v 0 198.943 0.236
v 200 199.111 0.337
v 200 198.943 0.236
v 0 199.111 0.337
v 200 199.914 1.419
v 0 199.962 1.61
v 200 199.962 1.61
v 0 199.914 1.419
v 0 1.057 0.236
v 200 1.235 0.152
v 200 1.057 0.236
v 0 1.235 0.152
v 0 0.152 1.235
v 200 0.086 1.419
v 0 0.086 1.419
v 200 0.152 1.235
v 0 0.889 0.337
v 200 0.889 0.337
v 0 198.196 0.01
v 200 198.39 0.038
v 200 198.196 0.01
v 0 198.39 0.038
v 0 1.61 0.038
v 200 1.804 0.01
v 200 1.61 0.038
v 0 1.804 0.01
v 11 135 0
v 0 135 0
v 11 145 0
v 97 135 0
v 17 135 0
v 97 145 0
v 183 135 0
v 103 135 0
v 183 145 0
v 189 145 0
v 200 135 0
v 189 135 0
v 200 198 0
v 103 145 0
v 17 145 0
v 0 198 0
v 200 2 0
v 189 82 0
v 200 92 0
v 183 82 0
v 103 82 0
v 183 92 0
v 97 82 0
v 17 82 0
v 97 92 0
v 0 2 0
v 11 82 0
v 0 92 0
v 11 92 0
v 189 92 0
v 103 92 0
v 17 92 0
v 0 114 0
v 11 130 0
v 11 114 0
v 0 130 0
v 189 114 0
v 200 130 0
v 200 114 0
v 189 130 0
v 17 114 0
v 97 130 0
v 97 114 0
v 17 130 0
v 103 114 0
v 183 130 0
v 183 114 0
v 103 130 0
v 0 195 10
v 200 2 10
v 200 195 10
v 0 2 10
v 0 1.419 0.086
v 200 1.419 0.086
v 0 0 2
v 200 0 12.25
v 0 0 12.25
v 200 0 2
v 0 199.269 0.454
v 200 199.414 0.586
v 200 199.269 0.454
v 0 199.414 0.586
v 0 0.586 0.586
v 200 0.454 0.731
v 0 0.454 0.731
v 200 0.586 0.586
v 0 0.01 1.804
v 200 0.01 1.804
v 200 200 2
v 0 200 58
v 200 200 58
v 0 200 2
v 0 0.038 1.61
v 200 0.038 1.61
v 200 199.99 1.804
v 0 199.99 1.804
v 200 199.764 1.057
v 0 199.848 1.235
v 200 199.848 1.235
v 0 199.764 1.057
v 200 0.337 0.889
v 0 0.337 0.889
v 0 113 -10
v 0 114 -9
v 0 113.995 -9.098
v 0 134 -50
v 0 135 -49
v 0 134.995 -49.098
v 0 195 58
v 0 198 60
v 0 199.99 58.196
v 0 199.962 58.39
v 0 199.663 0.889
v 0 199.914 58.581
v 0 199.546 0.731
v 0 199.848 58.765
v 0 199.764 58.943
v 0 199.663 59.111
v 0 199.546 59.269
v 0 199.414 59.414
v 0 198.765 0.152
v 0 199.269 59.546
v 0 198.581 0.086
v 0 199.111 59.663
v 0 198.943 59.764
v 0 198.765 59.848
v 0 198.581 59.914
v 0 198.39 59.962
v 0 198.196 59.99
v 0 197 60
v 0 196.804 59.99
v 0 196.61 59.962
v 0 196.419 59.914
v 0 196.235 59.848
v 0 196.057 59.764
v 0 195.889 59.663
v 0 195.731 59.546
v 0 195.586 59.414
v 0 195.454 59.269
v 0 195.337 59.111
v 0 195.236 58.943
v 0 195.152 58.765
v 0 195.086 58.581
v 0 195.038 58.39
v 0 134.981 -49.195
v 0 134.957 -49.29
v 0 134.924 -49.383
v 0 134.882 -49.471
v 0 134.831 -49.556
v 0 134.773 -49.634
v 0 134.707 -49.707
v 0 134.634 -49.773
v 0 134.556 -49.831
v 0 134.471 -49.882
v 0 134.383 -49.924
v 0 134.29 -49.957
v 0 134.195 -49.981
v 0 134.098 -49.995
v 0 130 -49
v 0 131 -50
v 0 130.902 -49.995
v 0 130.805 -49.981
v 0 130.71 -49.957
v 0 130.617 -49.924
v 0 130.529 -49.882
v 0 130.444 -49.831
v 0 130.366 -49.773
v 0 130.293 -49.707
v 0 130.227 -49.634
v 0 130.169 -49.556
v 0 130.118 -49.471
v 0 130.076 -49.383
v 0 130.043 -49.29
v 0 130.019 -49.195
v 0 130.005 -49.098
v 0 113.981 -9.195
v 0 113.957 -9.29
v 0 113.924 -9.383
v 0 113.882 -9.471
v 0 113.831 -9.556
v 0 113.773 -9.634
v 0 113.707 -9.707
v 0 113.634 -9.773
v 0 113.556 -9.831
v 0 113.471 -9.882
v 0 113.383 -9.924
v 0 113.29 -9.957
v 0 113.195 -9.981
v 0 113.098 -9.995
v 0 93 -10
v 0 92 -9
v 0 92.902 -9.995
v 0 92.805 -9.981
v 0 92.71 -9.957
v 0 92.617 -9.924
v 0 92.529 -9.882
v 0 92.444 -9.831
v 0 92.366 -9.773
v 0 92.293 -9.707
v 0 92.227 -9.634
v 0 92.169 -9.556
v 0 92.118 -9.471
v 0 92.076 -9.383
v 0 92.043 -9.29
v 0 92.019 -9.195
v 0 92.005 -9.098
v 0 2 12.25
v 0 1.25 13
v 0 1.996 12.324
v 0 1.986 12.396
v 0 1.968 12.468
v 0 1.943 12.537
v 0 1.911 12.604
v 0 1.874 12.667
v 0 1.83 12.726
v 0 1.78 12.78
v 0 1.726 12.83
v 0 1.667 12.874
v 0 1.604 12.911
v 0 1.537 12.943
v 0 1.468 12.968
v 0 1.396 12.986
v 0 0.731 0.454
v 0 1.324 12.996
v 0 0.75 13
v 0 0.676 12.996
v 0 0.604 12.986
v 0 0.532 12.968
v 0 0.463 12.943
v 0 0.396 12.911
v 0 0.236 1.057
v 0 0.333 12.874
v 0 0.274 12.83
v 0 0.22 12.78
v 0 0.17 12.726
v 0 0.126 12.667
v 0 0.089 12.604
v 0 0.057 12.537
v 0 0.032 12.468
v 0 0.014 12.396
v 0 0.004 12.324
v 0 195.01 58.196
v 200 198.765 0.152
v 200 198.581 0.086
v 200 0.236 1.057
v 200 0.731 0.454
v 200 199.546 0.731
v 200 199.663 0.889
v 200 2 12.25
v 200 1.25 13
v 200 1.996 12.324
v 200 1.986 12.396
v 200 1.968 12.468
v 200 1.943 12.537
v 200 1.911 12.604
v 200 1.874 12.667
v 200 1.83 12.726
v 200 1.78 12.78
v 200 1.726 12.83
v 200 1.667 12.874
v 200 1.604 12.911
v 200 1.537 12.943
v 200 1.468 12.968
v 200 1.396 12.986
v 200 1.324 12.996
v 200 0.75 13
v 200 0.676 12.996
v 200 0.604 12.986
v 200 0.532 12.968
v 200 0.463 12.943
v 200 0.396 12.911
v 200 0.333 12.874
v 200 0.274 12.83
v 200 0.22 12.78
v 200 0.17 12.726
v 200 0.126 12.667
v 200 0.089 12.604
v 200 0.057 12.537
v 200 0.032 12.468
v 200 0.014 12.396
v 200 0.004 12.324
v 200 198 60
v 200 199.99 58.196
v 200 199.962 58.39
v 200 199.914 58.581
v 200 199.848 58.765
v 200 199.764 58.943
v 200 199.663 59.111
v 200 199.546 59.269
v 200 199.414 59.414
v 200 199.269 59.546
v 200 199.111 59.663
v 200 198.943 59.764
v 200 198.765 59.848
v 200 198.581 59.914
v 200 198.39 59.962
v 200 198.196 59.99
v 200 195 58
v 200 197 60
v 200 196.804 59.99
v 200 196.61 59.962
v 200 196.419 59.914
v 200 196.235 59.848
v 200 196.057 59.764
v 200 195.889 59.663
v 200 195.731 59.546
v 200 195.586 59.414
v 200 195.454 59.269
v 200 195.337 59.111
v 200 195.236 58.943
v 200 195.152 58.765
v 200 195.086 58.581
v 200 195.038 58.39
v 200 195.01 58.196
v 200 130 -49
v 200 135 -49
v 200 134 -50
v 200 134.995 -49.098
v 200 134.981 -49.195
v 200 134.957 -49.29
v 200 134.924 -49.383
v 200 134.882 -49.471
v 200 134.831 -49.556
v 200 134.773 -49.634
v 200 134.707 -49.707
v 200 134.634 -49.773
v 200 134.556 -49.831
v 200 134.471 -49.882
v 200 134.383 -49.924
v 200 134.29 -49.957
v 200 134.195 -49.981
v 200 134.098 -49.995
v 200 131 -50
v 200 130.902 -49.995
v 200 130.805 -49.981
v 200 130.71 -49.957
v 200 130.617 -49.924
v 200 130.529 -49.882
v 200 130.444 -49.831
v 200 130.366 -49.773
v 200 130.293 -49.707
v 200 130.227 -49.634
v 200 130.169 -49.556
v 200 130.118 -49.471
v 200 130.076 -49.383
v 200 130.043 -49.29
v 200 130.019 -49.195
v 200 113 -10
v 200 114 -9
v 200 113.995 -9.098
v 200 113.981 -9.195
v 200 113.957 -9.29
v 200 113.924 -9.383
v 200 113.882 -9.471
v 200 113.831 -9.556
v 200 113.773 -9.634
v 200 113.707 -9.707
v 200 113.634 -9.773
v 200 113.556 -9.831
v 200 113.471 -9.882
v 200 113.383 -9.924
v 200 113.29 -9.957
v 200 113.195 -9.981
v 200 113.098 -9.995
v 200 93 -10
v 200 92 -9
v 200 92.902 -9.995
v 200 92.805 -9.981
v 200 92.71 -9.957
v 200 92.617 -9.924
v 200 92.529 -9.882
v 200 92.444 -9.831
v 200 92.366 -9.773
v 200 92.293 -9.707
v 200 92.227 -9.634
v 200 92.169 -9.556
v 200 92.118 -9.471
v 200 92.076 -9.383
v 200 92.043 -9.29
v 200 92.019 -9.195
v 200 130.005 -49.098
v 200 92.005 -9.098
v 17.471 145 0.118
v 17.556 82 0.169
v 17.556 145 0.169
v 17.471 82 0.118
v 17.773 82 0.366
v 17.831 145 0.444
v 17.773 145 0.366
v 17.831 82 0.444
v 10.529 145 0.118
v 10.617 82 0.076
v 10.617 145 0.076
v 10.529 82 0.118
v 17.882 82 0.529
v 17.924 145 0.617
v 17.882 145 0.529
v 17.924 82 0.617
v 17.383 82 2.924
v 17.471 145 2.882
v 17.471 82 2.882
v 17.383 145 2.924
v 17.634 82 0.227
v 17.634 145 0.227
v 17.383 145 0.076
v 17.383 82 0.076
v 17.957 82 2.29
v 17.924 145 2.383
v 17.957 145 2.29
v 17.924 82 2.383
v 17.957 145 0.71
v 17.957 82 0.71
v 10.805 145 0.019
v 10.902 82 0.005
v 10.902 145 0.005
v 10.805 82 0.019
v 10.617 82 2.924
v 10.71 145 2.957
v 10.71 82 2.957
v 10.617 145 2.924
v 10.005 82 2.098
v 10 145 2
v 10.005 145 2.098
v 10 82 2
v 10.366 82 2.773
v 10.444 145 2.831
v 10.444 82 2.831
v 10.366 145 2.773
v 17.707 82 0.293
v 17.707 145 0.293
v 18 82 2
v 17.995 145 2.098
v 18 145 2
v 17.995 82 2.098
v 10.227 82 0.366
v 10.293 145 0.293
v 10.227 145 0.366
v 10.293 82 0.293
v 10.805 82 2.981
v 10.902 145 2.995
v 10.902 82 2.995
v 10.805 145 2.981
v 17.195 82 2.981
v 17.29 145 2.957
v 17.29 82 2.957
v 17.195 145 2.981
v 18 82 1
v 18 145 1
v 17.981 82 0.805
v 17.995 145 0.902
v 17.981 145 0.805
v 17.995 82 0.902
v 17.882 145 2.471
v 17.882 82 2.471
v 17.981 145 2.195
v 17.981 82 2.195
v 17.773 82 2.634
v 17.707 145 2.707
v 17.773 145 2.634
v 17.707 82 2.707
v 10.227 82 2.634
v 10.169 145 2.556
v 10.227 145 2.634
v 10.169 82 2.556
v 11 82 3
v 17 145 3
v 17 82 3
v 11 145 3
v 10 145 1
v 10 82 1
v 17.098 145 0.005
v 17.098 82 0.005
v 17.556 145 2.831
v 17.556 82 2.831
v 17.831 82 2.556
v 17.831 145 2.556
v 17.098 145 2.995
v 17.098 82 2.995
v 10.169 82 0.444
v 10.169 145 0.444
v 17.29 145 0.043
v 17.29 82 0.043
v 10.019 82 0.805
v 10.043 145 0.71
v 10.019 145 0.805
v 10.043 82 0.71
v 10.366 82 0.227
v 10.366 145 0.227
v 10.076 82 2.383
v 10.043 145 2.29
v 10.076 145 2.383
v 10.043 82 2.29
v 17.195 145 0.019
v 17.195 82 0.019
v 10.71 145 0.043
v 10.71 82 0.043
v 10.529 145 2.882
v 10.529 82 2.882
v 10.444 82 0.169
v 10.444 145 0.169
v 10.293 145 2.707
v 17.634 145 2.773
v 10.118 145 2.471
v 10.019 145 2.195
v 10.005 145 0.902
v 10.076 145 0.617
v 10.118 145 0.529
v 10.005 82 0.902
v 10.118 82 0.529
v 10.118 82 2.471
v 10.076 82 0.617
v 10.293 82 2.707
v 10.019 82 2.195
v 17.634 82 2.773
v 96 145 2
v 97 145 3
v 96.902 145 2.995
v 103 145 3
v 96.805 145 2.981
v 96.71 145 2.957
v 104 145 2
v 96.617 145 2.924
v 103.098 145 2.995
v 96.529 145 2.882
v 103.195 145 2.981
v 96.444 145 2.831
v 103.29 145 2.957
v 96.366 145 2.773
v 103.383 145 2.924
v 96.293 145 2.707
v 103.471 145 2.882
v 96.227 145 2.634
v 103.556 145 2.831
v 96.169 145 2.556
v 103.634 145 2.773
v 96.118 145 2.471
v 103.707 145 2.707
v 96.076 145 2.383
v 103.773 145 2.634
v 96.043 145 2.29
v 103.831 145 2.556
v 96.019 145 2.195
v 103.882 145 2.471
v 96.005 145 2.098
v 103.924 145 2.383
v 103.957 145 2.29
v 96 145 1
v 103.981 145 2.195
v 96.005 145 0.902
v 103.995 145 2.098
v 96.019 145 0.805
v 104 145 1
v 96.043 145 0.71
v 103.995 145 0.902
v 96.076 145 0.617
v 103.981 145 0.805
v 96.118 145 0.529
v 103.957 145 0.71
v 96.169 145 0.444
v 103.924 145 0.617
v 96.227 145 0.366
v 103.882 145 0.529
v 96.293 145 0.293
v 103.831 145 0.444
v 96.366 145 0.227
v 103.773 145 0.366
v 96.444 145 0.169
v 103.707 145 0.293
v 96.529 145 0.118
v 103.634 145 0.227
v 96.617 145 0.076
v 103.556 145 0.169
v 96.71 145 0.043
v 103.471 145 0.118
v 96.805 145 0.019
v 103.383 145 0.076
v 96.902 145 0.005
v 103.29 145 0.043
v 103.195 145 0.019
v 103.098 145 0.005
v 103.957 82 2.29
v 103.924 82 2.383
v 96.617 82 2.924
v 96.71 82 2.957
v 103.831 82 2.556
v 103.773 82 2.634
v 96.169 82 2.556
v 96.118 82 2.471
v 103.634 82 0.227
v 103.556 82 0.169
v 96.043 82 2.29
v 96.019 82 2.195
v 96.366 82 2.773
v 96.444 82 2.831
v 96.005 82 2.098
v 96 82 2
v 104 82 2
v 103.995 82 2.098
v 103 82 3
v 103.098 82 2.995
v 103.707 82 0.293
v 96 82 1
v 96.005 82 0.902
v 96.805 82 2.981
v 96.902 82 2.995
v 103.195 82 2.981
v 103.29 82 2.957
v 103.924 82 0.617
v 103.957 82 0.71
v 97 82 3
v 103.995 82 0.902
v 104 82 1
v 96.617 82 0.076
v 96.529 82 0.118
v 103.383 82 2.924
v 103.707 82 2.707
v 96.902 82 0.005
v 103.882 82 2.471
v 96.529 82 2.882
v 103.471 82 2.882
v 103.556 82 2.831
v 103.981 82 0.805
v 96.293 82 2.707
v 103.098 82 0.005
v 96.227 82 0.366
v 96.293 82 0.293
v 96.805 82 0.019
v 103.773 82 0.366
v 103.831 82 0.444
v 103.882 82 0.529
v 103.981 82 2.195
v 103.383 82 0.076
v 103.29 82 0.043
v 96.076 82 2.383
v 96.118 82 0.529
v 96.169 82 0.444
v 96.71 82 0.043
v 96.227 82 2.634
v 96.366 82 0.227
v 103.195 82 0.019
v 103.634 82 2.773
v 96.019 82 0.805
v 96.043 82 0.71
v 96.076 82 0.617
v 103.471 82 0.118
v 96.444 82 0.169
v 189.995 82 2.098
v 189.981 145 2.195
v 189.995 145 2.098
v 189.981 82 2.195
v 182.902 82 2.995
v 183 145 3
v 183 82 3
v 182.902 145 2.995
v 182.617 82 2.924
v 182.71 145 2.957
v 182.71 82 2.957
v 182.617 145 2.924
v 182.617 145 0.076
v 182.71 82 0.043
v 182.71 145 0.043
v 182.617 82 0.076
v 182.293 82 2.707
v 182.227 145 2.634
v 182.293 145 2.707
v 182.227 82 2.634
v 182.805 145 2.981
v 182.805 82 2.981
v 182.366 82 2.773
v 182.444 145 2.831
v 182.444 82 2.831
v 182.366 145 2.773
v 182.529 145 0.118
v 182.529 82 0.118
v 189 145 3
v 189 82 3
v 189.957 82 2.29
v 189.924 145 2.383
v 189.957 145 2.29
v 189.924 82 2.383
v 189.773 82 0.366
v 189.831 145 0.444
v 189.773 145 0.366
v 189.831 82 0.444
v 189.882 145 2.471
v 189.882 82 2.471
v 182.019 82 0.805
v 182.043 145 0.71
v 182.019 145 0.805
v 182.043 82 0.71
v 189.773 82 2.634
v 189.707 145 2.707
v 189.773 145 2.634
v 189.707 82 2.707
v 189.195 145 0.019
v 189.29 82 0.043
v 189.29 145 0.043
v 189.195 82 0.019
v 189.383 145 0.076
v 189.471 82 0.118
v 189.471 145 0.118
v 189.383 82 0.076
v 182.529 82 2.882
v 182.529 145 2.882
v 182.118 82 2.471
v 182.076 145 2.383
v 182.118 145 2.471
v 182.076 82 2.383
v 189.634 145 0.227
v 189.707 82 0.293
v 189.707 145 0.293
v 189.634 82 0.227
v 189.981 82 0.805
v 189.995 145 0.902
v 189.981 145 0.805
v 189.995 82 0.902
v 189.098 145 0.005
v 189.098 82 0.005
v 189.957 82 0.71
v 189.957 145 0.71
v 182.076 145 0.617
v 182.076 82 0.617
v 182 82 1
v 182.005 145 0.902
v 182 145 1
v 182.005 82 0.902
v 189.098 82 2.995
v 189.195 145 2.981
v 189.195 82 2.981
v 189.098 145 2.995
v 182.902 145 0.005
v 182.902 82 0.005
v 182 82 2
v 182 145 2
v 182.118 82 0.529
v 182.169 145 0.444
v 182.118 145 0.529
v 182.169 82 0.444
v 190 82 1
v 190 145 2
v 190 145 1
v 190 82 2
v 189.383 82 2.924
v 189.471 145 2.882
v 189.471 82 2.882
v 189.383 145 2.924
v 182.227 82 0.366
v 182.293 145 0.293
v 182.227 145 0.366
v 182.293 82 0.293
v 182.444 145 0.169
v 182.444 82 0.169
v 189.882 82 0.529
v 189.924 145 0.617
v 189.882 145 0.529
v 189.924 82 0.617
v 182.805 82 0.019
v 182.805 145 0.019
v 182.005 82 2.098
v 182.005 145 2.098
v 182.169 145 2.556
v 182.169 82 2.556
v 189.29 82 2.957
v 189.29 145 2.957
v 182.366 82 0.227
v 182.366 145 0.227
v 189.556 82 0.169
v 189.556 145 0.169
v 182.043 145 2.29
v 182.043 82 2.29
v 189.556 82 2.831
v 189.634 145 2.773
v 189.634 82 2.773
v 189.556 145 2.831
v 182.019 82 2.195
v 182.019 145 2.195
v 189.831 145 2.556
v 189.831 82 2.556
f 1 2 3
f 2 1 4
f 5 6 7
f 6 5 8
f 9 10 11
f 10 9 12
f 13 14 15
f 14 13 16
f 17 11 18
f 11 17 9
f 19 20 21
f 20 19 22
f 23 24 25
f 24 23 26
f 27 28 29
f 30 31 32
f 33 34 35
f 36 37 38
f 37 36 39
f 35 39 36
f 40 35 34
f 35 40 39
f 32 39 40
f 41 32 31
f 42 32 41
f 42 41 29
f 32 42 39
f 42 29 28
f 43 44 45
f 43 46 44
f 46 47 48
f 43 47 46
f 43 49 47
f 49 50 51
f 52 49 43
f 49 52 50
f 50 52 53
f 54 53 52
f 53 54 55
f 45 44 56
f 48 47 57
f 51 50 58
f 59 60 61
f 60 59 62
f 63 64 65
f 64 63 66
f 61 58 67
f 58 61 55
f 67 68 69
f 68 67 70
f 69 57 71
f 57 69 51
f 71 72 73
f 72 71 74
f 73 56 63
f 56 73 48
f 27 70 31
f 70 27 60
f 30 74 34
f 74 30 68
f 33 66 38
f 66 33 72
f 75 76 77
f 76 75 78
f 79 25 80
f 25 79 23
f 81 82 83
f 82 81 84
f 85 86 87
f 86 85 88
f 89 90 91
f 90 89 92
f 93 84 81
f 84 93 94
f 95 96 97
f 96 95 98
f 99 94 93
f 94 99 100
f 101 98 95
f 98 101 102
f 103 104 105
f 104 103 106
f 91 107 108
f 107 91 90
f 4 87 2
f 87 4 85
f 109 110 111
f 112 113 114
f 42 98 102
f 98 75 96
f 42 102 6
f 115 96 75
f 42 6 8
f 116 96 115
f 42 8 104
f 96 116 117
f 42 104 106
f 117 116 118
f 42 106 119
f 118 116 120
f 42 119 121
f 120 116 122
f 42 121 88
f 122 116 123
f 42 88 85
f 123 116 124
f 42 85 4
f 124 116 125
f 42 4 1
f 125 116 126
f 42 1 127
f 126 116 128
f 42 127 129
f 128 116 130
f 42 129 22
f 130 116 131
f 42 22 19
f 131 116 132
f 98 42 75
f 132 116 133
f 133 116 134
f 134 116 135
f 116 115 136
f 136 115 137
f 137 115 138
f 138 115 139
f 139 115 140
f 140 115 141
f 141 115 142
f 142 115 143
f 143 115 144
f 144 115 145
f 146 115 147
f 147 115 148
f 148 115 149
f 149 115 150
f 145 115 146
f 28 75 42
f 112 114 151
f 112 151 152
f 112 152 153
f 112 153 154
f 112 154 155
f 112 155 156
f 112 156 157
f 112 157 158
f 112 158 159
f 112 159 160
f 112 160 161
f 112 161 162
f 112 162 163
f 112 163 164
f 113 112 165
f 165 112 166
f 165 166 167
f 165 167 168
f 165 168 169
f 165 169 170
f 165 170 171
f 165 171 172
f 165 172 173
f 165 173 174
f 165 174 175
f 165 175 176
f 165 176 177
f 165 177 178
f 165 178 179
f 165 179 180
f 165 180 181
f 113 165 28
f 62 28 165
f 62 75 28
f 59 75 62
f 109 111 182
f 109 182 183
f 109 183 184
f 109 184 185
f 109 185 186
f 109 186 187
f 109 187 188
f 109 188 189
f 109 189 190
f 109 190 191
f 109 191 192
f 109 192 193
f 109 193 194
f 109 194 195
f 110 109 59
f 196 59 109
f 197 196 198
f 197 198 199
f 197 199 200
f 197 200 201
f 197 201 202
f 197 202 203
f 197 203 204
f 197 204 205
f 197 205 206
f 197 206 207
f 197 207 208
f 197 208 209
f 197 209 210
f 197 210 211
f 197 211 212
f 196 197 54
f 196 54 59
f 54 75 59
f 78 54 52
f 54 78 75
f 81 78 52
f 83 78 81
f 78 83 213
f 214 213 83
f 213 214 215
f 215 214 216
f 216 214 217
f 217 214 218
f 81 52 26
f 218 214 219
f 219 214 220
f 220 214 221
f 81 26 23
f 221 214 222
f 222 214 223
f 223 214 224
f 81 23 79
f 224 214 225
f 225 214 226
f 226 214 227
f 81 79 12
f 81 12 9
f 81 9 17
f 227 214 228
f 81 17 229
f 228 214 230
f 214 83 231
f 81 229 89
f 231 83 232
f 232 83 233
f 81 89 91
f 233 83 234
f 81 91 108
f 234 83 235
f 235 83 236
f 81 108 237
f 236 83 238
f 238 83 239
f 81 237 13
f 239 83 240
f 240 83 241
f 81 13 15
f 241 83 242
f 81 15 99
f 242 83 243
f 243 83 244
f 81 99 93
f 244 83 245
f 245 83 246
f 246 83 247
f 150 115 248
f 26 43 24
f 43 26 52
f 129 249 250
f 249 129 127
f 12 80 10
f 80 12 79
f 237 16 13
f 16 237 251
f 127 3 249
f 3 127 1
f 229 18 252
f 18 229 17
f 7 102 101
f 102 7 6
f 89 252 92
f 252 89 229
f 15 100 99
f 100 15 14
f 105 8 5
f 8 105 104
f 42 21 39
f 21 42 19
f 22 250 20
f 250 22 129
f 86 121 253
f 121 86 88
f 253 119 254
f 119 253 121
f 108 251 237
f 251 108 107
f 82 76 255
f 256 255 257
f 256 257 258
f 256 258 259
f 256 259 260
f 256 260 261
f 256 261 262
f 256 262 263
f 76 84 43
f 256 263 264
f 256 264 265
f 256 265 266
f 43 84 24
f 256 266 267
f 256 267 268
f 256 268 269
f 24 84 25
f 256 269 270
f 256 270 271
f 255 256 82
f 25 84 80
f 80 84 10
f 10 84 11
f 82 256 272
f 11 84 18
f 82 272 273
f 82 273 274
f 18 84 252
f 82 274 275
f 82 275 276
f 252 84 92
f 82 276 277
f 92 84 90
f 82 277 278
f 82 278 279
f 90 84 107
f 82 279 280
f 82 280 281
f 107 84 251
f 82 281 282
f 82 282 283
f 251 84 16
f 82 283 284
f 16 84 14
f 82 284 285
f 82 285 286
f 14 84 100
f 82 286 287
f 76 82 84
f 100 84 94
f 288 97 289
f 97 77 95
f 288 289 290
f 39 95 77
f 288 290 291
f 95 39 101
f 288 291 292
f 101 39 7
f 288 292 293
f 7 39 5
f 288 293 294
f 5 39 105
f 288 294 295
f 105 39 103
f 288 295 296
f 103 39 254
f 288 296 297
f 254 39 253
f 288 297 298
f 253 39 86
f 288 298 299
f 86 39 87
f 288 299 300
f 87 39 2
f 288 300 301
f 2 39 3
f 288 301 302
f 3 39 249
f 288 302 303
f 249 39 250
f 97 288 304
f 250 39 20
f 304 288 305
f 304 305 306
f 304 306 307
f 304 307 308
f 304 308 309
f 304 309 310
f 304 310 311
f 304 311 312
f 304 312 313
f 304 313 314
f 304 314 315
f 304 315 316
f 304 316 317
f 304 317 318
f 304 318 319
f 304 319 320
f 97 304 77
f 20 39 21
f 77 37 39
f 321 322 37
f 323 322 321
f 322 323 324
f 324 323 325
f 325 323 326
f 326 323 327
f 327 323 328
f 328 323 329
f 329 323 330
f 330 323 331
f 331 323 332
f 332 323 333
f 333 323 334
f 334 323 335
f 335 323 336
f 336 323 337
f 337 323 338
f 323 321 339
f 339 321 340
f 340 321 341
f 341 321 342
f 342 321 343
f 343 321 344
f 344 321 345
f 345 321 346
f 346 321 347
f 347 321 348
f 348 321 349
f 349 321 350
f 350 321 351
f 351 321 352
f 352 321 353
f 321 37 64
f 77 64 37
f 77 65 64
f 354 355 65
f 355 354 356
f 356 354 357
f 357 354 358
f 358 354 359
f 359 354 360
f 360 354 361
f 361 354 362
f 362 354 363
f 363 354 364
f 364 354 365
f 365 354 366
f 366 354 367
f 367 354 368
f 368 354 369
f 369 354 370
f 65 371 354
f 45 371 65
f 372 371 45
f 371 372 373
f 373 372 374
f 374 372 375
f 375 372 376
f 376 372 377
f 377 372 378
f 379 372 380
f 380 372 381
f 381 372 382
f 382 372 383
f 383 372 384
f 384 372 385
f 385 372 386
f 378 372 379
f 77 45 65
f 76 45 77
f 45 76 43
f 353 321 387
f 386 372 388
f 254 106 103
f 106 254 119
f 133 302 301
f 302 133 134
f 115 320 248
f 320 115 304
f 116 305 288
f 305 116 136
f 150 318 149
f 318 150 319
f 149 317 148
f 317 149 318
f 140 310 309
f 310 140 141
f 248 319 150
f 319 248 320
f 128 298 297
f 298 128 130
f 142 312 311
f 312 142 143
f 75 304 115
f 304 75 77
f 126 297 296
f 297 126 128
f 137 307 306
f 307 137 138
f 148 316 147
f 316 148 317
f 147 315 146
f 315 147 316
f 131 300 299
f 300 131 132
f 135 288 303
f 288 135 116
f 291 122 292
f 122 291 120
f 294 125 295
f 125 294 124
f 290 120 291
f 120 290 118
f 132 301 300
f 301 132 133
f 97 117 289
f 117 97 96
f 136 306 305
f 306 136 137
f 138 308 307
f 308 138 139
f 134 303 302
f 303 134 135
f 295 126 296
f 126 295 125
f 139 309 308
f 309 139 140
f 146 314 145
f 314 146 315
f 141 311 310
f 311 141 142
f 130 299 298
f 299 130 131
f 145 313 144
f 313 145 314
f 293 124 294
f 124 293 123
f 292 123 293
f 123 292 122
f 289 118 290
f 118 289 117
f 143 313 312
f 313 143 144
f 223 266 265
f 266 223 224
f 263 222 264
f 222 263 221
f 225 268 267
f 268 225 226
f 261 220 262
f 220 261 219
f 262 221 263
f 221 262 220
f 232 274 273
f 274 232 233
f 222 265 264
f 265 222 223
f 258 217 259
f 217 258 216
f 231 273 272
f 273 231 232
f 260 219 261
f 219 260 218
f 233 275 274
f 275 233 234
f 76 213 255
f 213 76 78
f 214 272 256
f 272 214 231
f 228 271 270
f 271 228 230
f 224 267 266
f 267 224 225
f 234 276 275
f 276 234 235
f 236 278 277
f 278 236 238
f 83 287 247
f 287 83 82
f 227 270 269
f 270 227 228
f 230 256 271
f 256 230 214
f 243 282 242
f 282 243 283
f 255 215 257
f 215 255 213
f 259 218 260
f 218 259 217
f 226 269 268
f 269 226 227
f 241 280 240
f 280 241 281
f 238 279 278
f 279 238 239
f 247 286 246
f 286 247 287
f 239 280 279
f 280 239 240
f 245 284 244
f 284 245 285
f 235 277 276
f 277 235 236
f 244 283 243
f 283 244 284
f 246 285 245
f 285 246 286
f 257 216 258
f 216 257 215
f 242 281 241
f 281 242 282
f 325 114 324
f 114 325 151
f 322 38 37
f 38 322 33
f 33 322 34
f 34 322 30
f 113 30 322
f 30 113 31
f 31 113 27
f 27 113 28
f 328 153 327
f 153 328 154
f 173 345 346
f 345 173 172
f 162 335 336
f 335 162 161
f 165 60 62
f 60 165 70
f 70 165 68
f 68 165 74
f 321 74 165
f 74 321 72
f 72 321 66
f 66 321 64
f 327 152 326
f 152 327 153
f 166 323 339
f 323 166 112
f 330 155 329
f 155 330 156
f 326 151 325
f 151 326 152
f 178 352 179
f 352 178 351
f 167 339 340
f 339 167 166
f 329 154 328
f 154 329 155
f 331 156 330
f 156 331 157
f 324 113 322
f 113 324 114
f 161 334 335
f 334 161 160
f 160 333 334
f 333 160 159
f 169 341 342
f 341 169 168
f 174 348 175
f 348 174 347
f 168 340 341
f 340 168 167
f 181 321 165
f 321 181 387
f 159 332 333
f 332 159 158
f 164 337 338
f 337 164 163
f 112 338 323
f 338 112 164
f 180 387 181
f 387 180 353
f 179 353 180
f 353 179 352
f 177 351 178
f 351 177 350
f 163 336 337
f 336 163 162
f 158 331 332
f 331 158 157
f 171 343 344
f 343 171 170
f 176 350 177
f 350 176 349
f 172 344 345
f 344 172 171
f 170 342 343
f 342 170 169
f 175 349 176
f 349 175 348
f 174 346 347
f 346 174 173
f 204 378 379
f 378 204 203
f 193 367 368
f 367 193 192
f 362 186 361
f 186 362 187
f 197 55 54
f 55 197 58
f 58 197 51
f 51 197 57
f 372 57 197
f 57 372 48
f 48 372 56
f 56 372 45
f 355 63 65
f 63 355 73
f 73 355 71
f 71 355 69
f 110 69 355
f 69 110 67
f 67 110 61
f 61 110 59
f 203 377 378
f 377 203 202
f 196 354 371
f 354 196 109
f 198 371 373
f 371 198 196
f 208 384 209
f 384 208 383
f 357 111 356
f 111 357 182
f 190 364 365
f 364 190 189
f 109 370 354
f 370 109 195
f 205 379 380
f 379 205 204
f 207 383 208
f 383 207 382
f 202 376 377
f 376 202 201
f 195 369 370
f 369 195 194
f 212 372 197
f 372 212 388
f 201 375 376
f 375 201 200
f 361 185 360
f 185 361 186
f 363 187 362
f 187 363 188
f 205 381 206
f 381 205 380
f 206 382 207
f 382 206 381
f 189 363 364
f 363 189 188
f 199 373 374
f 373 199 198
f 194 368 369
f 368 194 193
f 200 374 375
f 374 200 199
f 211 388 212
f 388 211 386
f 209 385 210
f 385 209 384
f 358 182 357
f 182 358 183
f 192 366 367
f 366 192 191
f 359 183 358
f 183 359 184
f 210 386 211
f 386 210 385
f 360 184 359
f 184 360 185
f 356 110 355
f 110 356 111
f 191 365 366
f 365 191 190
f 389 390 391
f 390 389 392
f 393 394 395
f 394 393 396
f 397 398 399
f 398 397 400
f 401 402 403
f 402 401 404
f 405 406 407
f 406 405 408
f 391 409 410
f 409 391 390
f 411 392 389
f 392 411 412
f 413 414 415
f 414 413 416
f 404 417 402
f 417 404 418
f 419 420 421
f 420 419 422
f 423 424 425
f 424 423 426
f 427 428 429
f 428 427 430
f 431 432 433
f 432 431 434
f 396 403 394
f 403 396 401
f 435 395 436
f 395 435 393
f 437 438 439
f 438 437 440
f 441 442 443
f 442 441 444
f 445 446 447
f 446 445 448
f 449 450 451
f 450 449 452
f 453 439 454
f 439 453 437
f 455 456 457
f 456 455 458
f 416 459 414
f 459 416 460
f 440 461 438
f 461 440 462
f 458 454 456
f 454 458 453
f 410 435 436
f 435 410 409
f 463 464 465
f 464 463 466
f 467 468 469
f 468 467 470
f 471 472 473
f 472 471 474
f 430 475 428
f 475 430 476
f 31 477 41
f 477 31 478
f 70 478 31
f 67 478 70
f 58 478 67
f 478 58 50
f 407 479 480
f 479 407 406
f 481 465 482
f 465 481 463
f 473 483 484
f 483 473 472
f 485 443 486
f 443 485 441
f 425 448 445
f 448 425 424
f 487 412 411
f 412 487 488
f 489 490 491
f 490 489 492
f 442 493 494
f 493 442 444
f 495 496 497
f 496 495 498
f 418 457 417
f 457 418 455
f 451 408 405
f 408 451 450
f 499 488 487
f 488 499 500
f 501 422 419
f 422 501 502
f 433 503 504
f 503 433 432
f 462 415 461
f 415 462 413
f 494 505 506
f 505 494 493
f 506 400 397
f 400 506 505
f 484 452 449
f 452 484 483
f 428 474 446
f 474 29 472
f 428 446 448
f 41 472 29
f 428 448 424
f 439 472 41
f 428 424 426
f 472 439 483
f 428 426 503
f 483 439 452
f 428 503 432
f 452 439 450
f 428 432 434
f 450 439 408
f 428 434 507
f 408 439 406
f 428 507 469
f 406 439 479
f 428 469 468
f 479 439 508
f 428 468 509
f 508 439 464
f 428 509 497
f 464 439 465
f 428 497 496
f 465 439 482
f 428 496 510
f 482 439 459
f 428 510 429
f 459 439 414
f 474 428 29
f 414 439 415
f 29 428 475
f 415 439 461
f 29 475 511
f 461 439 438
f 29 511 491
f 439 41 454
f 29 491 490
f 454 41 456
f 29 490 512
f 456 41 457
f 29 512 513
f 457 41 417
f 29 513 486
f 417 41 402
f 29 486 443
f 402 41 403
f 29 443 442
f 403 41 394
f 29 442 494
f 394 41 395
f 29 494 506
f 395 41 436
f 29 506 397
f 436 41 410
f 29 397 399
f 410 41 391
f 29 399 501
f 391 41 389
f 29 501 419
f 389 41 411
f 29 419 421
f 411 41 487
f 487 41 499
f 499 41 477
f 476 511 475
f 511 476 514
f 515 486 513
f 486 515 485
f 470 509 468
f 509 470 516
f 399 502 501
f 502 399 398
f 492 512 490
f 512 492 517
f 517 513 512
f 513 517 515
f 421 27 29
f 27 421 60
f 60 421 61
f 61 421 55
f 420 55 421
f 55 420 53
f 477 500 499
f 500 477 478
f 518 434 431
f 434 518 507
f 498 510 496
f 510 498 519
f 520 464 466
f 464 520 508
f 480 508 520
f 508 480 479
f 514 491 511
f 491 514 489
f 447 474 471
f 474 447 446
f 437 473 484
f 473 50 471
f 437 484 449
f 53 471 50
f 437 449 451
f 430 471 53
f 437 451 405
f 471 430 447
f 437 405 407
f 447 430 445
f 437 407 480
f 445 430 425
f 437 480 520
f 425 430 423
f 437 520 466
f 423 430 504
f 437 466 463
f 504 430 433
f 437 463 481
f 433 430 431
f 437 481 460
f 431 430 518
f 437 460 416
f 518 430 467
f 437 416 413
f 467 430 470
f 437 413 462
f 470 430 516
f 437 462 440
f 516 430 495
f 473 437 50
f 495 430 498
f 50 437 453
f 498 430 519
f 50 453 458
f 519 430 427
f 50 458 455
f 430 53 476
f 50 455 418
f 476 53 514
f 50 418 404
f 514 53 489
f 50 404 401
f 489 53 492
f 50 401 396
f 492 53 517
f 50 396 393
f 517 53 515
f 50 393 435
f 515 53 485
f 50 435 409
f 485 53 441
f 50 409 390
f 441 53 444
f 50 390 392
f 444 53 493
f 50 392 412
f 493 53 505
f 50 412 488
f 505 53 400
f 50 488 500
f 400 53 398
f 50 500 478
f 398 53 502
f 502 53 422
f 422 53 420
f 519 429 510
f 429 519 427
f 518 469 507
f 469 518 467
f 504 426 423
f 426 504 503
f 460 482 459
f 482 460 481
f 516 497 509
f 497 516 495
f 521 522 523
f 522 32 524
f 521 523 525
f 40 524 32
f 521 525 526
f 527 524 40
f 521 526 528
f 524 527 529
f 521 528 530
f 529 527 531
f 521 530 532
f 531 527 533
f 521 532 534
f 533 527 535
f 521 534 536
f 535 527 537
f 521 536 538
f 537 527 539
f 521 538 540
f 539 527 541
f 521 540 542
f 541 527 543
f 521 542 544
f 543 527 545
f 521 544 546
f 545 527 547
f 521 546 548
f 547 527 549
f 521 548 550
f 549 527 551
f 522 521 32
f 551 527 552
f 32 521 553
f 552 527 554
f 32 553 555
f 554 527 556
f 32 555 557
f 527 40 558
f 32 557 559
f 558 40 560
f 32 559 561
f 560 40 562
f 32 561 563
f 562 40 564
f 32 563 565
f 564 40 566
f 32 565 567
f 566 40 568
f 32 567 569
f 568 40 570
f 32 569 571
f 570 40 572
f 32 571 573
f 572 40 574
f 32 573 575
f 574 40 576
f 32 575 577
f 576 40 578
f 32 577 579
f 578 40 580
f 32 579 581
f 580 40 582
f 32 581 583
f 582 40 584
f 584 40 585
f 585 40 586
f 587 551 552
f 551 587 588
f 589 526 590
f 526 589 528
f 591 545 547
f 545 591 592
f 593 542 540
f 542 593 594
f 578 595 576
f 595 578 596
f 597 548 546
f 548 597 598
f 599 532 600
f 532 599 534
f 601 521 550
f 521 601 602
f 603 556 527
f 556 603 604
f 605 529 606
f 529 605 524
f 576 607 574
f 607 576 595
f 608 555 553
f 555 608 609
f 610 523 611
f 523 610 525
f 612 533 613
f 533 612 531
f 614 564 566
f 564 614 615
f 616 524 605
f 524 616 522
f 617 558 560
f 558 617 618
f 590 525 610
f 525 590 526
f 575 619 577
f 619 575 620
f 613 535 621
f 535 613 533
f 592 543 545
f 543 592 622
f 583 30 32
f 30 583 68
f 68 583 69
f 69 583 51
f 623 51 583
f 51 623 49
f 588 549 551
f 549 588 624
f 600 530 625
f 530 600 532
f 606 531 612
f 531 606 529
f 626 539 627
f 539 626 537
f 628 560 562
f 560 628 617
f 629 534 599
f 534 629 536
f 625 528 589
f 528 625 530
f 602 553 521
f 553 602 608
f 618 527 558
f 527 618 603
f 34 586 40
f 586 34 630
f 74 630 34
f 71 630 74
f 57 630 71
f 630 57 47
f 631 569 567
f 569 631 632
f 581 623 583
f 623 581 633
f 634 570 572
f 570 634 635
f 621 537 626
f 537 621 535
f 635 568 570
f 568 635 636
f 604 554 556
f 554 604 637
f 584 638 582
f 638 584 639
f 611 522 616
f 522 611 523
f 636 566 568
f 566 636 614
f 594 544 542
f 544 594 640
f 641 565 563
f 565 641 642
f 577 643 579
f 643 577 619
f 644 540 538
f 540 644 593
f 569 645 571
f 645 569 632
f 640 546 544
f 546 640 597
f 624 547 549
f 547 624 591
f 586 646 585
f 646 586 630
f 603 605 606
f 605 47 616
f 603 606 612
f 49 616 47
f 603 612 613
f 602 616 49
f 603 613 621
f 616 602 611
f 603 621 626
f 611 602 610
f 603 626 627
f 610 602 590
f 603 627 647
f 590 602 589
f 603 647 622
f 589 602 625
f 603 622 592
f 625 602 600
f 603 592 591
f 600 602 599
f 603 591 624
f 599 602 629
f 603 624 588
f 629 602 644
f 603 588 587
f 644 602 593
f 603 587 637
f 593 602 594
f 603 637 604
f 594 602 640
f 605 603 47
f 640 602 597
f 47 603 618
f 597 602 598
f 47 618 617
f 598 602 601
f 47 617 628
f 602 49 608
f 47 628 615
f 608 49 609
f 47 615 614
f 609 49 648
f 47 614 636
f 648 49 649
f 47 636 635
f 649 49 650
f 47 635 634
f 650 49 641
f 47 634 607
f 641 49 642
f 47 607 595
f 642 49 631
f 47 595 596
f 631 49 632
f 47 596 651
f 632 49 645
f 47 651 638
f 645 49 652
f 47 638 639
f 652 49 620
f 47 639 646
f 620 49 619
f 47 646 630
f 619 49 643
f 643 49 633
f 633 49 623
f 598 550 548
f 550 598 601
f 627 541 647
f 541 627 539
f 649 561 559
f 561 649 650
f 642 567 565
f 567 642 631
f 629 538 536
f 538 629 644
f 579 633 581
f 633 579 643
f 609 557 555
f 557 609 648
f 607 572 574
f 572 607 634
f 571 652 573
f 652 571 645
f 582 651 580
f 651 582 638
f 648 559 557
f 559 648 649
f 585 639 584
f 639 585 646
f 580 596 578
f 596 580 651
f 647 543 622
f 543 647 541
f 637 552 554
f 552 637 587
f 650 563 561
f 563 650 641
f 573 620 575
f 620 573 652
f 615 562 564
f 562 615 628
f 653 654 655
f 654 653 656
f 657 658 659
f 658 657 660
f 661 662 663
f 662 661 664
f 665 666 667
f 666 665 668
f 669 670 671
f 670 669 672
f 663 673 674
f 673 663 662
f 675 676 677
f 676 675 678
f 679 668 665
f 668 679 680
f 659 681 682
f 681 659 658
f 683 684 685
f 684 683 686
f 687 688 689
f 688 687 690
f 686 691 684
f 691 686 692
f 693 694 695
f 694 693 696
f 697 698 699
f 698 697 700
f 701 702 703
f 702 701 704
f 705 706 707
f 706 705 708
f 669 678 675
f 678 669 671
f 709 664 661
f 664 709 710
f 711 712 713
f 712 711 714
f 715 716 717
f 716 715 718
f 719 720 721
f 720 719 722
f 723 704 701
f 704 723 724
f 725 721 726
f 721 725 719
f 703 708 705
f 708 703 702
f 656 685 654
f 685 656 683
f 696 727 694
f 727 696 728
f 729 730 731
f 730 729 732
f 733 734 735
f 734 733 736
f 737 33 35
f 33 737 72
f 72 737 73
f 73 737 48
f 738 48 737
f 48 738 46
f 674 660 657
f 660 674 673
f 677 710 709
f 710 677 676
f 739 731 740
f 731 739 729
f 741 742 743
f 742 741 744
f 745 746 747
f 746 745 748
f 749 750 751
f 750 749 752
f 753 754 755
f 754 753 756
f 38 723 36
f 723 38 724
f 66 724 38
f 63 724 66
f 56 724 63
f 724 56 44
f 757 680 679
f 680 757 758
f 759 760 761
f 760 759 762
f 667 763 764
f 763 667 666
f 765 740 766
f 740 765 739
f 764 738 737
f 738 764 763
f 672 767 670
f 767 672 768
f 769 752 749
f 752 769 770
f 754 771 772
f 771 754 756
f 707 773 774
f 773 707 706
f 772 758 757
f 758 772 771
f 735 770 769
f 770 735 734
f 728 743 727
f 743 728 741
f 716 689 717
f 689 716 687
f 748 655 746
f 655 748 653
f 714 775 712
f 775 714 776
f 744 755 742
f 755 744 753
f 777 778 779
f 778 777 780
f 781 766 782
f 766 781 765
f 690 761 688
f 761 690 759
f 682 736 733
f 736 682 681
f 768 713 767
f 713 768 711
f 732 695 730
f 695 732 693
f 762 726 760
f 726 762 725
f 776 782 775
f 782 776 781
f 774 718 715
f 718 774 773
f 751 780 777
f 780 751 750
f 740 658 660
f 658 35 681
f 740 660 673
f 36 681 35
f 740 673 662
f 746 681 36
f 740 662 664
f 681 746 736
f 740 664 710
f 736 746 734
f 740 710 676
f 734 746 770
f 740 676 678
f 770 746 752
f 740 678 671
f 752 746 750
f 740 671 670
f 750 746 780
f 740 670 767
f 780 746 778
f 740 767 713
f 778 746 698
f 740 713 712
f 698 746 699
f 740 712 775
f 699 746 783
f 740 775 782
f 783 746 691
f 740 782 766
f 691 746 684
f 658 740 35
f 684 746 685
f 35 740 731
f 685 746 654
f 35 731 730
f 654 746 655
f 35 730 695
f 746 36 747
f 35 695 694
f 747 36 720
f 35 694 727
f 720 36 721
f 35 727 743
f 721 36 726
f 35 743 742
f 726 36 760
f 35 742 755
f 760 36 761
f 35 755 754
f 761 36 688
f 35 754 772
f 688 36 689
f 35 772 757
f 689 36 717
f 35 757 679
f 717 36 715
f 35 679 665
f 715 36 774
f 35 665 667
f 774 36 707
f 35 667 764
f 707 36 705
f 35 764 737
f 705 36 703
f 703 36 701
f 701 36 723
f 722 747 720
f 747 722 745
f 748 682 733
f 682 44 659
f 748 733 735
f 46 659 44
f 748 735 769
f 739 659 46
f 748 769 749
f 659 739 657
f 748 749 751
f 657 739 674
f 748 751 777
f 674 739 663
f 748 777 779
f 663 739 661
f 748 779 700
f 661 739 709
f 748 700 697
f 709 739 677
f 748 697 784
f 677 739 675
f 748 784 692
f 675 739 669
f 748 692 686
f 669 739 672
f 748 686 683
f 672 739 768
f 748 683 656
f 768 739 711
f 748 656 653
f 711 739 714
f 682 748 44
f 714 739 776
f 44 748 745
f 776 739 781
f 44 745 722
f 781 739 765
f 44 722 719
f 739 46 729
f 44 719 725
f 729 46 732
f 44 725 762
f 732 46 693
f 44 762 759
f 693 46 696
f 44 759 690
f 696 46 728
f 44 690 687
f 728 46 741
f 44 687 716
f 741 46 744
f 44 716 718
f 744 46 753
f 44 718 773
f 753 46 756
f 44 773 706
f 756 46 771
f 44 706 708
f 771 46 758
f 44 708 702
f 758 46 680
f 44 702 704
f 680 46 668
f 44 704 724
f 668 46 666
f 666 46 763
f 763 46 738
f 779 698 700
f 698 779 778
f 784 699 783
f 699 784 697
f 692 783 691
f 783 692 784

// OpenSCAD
// 200mm-wide × 200mm-deep bar shelf — see bar_shelf.scad for the design.
shelf_width_override = 200;
shelf_depth_override = 200;
include <bar_shelf.scad>
